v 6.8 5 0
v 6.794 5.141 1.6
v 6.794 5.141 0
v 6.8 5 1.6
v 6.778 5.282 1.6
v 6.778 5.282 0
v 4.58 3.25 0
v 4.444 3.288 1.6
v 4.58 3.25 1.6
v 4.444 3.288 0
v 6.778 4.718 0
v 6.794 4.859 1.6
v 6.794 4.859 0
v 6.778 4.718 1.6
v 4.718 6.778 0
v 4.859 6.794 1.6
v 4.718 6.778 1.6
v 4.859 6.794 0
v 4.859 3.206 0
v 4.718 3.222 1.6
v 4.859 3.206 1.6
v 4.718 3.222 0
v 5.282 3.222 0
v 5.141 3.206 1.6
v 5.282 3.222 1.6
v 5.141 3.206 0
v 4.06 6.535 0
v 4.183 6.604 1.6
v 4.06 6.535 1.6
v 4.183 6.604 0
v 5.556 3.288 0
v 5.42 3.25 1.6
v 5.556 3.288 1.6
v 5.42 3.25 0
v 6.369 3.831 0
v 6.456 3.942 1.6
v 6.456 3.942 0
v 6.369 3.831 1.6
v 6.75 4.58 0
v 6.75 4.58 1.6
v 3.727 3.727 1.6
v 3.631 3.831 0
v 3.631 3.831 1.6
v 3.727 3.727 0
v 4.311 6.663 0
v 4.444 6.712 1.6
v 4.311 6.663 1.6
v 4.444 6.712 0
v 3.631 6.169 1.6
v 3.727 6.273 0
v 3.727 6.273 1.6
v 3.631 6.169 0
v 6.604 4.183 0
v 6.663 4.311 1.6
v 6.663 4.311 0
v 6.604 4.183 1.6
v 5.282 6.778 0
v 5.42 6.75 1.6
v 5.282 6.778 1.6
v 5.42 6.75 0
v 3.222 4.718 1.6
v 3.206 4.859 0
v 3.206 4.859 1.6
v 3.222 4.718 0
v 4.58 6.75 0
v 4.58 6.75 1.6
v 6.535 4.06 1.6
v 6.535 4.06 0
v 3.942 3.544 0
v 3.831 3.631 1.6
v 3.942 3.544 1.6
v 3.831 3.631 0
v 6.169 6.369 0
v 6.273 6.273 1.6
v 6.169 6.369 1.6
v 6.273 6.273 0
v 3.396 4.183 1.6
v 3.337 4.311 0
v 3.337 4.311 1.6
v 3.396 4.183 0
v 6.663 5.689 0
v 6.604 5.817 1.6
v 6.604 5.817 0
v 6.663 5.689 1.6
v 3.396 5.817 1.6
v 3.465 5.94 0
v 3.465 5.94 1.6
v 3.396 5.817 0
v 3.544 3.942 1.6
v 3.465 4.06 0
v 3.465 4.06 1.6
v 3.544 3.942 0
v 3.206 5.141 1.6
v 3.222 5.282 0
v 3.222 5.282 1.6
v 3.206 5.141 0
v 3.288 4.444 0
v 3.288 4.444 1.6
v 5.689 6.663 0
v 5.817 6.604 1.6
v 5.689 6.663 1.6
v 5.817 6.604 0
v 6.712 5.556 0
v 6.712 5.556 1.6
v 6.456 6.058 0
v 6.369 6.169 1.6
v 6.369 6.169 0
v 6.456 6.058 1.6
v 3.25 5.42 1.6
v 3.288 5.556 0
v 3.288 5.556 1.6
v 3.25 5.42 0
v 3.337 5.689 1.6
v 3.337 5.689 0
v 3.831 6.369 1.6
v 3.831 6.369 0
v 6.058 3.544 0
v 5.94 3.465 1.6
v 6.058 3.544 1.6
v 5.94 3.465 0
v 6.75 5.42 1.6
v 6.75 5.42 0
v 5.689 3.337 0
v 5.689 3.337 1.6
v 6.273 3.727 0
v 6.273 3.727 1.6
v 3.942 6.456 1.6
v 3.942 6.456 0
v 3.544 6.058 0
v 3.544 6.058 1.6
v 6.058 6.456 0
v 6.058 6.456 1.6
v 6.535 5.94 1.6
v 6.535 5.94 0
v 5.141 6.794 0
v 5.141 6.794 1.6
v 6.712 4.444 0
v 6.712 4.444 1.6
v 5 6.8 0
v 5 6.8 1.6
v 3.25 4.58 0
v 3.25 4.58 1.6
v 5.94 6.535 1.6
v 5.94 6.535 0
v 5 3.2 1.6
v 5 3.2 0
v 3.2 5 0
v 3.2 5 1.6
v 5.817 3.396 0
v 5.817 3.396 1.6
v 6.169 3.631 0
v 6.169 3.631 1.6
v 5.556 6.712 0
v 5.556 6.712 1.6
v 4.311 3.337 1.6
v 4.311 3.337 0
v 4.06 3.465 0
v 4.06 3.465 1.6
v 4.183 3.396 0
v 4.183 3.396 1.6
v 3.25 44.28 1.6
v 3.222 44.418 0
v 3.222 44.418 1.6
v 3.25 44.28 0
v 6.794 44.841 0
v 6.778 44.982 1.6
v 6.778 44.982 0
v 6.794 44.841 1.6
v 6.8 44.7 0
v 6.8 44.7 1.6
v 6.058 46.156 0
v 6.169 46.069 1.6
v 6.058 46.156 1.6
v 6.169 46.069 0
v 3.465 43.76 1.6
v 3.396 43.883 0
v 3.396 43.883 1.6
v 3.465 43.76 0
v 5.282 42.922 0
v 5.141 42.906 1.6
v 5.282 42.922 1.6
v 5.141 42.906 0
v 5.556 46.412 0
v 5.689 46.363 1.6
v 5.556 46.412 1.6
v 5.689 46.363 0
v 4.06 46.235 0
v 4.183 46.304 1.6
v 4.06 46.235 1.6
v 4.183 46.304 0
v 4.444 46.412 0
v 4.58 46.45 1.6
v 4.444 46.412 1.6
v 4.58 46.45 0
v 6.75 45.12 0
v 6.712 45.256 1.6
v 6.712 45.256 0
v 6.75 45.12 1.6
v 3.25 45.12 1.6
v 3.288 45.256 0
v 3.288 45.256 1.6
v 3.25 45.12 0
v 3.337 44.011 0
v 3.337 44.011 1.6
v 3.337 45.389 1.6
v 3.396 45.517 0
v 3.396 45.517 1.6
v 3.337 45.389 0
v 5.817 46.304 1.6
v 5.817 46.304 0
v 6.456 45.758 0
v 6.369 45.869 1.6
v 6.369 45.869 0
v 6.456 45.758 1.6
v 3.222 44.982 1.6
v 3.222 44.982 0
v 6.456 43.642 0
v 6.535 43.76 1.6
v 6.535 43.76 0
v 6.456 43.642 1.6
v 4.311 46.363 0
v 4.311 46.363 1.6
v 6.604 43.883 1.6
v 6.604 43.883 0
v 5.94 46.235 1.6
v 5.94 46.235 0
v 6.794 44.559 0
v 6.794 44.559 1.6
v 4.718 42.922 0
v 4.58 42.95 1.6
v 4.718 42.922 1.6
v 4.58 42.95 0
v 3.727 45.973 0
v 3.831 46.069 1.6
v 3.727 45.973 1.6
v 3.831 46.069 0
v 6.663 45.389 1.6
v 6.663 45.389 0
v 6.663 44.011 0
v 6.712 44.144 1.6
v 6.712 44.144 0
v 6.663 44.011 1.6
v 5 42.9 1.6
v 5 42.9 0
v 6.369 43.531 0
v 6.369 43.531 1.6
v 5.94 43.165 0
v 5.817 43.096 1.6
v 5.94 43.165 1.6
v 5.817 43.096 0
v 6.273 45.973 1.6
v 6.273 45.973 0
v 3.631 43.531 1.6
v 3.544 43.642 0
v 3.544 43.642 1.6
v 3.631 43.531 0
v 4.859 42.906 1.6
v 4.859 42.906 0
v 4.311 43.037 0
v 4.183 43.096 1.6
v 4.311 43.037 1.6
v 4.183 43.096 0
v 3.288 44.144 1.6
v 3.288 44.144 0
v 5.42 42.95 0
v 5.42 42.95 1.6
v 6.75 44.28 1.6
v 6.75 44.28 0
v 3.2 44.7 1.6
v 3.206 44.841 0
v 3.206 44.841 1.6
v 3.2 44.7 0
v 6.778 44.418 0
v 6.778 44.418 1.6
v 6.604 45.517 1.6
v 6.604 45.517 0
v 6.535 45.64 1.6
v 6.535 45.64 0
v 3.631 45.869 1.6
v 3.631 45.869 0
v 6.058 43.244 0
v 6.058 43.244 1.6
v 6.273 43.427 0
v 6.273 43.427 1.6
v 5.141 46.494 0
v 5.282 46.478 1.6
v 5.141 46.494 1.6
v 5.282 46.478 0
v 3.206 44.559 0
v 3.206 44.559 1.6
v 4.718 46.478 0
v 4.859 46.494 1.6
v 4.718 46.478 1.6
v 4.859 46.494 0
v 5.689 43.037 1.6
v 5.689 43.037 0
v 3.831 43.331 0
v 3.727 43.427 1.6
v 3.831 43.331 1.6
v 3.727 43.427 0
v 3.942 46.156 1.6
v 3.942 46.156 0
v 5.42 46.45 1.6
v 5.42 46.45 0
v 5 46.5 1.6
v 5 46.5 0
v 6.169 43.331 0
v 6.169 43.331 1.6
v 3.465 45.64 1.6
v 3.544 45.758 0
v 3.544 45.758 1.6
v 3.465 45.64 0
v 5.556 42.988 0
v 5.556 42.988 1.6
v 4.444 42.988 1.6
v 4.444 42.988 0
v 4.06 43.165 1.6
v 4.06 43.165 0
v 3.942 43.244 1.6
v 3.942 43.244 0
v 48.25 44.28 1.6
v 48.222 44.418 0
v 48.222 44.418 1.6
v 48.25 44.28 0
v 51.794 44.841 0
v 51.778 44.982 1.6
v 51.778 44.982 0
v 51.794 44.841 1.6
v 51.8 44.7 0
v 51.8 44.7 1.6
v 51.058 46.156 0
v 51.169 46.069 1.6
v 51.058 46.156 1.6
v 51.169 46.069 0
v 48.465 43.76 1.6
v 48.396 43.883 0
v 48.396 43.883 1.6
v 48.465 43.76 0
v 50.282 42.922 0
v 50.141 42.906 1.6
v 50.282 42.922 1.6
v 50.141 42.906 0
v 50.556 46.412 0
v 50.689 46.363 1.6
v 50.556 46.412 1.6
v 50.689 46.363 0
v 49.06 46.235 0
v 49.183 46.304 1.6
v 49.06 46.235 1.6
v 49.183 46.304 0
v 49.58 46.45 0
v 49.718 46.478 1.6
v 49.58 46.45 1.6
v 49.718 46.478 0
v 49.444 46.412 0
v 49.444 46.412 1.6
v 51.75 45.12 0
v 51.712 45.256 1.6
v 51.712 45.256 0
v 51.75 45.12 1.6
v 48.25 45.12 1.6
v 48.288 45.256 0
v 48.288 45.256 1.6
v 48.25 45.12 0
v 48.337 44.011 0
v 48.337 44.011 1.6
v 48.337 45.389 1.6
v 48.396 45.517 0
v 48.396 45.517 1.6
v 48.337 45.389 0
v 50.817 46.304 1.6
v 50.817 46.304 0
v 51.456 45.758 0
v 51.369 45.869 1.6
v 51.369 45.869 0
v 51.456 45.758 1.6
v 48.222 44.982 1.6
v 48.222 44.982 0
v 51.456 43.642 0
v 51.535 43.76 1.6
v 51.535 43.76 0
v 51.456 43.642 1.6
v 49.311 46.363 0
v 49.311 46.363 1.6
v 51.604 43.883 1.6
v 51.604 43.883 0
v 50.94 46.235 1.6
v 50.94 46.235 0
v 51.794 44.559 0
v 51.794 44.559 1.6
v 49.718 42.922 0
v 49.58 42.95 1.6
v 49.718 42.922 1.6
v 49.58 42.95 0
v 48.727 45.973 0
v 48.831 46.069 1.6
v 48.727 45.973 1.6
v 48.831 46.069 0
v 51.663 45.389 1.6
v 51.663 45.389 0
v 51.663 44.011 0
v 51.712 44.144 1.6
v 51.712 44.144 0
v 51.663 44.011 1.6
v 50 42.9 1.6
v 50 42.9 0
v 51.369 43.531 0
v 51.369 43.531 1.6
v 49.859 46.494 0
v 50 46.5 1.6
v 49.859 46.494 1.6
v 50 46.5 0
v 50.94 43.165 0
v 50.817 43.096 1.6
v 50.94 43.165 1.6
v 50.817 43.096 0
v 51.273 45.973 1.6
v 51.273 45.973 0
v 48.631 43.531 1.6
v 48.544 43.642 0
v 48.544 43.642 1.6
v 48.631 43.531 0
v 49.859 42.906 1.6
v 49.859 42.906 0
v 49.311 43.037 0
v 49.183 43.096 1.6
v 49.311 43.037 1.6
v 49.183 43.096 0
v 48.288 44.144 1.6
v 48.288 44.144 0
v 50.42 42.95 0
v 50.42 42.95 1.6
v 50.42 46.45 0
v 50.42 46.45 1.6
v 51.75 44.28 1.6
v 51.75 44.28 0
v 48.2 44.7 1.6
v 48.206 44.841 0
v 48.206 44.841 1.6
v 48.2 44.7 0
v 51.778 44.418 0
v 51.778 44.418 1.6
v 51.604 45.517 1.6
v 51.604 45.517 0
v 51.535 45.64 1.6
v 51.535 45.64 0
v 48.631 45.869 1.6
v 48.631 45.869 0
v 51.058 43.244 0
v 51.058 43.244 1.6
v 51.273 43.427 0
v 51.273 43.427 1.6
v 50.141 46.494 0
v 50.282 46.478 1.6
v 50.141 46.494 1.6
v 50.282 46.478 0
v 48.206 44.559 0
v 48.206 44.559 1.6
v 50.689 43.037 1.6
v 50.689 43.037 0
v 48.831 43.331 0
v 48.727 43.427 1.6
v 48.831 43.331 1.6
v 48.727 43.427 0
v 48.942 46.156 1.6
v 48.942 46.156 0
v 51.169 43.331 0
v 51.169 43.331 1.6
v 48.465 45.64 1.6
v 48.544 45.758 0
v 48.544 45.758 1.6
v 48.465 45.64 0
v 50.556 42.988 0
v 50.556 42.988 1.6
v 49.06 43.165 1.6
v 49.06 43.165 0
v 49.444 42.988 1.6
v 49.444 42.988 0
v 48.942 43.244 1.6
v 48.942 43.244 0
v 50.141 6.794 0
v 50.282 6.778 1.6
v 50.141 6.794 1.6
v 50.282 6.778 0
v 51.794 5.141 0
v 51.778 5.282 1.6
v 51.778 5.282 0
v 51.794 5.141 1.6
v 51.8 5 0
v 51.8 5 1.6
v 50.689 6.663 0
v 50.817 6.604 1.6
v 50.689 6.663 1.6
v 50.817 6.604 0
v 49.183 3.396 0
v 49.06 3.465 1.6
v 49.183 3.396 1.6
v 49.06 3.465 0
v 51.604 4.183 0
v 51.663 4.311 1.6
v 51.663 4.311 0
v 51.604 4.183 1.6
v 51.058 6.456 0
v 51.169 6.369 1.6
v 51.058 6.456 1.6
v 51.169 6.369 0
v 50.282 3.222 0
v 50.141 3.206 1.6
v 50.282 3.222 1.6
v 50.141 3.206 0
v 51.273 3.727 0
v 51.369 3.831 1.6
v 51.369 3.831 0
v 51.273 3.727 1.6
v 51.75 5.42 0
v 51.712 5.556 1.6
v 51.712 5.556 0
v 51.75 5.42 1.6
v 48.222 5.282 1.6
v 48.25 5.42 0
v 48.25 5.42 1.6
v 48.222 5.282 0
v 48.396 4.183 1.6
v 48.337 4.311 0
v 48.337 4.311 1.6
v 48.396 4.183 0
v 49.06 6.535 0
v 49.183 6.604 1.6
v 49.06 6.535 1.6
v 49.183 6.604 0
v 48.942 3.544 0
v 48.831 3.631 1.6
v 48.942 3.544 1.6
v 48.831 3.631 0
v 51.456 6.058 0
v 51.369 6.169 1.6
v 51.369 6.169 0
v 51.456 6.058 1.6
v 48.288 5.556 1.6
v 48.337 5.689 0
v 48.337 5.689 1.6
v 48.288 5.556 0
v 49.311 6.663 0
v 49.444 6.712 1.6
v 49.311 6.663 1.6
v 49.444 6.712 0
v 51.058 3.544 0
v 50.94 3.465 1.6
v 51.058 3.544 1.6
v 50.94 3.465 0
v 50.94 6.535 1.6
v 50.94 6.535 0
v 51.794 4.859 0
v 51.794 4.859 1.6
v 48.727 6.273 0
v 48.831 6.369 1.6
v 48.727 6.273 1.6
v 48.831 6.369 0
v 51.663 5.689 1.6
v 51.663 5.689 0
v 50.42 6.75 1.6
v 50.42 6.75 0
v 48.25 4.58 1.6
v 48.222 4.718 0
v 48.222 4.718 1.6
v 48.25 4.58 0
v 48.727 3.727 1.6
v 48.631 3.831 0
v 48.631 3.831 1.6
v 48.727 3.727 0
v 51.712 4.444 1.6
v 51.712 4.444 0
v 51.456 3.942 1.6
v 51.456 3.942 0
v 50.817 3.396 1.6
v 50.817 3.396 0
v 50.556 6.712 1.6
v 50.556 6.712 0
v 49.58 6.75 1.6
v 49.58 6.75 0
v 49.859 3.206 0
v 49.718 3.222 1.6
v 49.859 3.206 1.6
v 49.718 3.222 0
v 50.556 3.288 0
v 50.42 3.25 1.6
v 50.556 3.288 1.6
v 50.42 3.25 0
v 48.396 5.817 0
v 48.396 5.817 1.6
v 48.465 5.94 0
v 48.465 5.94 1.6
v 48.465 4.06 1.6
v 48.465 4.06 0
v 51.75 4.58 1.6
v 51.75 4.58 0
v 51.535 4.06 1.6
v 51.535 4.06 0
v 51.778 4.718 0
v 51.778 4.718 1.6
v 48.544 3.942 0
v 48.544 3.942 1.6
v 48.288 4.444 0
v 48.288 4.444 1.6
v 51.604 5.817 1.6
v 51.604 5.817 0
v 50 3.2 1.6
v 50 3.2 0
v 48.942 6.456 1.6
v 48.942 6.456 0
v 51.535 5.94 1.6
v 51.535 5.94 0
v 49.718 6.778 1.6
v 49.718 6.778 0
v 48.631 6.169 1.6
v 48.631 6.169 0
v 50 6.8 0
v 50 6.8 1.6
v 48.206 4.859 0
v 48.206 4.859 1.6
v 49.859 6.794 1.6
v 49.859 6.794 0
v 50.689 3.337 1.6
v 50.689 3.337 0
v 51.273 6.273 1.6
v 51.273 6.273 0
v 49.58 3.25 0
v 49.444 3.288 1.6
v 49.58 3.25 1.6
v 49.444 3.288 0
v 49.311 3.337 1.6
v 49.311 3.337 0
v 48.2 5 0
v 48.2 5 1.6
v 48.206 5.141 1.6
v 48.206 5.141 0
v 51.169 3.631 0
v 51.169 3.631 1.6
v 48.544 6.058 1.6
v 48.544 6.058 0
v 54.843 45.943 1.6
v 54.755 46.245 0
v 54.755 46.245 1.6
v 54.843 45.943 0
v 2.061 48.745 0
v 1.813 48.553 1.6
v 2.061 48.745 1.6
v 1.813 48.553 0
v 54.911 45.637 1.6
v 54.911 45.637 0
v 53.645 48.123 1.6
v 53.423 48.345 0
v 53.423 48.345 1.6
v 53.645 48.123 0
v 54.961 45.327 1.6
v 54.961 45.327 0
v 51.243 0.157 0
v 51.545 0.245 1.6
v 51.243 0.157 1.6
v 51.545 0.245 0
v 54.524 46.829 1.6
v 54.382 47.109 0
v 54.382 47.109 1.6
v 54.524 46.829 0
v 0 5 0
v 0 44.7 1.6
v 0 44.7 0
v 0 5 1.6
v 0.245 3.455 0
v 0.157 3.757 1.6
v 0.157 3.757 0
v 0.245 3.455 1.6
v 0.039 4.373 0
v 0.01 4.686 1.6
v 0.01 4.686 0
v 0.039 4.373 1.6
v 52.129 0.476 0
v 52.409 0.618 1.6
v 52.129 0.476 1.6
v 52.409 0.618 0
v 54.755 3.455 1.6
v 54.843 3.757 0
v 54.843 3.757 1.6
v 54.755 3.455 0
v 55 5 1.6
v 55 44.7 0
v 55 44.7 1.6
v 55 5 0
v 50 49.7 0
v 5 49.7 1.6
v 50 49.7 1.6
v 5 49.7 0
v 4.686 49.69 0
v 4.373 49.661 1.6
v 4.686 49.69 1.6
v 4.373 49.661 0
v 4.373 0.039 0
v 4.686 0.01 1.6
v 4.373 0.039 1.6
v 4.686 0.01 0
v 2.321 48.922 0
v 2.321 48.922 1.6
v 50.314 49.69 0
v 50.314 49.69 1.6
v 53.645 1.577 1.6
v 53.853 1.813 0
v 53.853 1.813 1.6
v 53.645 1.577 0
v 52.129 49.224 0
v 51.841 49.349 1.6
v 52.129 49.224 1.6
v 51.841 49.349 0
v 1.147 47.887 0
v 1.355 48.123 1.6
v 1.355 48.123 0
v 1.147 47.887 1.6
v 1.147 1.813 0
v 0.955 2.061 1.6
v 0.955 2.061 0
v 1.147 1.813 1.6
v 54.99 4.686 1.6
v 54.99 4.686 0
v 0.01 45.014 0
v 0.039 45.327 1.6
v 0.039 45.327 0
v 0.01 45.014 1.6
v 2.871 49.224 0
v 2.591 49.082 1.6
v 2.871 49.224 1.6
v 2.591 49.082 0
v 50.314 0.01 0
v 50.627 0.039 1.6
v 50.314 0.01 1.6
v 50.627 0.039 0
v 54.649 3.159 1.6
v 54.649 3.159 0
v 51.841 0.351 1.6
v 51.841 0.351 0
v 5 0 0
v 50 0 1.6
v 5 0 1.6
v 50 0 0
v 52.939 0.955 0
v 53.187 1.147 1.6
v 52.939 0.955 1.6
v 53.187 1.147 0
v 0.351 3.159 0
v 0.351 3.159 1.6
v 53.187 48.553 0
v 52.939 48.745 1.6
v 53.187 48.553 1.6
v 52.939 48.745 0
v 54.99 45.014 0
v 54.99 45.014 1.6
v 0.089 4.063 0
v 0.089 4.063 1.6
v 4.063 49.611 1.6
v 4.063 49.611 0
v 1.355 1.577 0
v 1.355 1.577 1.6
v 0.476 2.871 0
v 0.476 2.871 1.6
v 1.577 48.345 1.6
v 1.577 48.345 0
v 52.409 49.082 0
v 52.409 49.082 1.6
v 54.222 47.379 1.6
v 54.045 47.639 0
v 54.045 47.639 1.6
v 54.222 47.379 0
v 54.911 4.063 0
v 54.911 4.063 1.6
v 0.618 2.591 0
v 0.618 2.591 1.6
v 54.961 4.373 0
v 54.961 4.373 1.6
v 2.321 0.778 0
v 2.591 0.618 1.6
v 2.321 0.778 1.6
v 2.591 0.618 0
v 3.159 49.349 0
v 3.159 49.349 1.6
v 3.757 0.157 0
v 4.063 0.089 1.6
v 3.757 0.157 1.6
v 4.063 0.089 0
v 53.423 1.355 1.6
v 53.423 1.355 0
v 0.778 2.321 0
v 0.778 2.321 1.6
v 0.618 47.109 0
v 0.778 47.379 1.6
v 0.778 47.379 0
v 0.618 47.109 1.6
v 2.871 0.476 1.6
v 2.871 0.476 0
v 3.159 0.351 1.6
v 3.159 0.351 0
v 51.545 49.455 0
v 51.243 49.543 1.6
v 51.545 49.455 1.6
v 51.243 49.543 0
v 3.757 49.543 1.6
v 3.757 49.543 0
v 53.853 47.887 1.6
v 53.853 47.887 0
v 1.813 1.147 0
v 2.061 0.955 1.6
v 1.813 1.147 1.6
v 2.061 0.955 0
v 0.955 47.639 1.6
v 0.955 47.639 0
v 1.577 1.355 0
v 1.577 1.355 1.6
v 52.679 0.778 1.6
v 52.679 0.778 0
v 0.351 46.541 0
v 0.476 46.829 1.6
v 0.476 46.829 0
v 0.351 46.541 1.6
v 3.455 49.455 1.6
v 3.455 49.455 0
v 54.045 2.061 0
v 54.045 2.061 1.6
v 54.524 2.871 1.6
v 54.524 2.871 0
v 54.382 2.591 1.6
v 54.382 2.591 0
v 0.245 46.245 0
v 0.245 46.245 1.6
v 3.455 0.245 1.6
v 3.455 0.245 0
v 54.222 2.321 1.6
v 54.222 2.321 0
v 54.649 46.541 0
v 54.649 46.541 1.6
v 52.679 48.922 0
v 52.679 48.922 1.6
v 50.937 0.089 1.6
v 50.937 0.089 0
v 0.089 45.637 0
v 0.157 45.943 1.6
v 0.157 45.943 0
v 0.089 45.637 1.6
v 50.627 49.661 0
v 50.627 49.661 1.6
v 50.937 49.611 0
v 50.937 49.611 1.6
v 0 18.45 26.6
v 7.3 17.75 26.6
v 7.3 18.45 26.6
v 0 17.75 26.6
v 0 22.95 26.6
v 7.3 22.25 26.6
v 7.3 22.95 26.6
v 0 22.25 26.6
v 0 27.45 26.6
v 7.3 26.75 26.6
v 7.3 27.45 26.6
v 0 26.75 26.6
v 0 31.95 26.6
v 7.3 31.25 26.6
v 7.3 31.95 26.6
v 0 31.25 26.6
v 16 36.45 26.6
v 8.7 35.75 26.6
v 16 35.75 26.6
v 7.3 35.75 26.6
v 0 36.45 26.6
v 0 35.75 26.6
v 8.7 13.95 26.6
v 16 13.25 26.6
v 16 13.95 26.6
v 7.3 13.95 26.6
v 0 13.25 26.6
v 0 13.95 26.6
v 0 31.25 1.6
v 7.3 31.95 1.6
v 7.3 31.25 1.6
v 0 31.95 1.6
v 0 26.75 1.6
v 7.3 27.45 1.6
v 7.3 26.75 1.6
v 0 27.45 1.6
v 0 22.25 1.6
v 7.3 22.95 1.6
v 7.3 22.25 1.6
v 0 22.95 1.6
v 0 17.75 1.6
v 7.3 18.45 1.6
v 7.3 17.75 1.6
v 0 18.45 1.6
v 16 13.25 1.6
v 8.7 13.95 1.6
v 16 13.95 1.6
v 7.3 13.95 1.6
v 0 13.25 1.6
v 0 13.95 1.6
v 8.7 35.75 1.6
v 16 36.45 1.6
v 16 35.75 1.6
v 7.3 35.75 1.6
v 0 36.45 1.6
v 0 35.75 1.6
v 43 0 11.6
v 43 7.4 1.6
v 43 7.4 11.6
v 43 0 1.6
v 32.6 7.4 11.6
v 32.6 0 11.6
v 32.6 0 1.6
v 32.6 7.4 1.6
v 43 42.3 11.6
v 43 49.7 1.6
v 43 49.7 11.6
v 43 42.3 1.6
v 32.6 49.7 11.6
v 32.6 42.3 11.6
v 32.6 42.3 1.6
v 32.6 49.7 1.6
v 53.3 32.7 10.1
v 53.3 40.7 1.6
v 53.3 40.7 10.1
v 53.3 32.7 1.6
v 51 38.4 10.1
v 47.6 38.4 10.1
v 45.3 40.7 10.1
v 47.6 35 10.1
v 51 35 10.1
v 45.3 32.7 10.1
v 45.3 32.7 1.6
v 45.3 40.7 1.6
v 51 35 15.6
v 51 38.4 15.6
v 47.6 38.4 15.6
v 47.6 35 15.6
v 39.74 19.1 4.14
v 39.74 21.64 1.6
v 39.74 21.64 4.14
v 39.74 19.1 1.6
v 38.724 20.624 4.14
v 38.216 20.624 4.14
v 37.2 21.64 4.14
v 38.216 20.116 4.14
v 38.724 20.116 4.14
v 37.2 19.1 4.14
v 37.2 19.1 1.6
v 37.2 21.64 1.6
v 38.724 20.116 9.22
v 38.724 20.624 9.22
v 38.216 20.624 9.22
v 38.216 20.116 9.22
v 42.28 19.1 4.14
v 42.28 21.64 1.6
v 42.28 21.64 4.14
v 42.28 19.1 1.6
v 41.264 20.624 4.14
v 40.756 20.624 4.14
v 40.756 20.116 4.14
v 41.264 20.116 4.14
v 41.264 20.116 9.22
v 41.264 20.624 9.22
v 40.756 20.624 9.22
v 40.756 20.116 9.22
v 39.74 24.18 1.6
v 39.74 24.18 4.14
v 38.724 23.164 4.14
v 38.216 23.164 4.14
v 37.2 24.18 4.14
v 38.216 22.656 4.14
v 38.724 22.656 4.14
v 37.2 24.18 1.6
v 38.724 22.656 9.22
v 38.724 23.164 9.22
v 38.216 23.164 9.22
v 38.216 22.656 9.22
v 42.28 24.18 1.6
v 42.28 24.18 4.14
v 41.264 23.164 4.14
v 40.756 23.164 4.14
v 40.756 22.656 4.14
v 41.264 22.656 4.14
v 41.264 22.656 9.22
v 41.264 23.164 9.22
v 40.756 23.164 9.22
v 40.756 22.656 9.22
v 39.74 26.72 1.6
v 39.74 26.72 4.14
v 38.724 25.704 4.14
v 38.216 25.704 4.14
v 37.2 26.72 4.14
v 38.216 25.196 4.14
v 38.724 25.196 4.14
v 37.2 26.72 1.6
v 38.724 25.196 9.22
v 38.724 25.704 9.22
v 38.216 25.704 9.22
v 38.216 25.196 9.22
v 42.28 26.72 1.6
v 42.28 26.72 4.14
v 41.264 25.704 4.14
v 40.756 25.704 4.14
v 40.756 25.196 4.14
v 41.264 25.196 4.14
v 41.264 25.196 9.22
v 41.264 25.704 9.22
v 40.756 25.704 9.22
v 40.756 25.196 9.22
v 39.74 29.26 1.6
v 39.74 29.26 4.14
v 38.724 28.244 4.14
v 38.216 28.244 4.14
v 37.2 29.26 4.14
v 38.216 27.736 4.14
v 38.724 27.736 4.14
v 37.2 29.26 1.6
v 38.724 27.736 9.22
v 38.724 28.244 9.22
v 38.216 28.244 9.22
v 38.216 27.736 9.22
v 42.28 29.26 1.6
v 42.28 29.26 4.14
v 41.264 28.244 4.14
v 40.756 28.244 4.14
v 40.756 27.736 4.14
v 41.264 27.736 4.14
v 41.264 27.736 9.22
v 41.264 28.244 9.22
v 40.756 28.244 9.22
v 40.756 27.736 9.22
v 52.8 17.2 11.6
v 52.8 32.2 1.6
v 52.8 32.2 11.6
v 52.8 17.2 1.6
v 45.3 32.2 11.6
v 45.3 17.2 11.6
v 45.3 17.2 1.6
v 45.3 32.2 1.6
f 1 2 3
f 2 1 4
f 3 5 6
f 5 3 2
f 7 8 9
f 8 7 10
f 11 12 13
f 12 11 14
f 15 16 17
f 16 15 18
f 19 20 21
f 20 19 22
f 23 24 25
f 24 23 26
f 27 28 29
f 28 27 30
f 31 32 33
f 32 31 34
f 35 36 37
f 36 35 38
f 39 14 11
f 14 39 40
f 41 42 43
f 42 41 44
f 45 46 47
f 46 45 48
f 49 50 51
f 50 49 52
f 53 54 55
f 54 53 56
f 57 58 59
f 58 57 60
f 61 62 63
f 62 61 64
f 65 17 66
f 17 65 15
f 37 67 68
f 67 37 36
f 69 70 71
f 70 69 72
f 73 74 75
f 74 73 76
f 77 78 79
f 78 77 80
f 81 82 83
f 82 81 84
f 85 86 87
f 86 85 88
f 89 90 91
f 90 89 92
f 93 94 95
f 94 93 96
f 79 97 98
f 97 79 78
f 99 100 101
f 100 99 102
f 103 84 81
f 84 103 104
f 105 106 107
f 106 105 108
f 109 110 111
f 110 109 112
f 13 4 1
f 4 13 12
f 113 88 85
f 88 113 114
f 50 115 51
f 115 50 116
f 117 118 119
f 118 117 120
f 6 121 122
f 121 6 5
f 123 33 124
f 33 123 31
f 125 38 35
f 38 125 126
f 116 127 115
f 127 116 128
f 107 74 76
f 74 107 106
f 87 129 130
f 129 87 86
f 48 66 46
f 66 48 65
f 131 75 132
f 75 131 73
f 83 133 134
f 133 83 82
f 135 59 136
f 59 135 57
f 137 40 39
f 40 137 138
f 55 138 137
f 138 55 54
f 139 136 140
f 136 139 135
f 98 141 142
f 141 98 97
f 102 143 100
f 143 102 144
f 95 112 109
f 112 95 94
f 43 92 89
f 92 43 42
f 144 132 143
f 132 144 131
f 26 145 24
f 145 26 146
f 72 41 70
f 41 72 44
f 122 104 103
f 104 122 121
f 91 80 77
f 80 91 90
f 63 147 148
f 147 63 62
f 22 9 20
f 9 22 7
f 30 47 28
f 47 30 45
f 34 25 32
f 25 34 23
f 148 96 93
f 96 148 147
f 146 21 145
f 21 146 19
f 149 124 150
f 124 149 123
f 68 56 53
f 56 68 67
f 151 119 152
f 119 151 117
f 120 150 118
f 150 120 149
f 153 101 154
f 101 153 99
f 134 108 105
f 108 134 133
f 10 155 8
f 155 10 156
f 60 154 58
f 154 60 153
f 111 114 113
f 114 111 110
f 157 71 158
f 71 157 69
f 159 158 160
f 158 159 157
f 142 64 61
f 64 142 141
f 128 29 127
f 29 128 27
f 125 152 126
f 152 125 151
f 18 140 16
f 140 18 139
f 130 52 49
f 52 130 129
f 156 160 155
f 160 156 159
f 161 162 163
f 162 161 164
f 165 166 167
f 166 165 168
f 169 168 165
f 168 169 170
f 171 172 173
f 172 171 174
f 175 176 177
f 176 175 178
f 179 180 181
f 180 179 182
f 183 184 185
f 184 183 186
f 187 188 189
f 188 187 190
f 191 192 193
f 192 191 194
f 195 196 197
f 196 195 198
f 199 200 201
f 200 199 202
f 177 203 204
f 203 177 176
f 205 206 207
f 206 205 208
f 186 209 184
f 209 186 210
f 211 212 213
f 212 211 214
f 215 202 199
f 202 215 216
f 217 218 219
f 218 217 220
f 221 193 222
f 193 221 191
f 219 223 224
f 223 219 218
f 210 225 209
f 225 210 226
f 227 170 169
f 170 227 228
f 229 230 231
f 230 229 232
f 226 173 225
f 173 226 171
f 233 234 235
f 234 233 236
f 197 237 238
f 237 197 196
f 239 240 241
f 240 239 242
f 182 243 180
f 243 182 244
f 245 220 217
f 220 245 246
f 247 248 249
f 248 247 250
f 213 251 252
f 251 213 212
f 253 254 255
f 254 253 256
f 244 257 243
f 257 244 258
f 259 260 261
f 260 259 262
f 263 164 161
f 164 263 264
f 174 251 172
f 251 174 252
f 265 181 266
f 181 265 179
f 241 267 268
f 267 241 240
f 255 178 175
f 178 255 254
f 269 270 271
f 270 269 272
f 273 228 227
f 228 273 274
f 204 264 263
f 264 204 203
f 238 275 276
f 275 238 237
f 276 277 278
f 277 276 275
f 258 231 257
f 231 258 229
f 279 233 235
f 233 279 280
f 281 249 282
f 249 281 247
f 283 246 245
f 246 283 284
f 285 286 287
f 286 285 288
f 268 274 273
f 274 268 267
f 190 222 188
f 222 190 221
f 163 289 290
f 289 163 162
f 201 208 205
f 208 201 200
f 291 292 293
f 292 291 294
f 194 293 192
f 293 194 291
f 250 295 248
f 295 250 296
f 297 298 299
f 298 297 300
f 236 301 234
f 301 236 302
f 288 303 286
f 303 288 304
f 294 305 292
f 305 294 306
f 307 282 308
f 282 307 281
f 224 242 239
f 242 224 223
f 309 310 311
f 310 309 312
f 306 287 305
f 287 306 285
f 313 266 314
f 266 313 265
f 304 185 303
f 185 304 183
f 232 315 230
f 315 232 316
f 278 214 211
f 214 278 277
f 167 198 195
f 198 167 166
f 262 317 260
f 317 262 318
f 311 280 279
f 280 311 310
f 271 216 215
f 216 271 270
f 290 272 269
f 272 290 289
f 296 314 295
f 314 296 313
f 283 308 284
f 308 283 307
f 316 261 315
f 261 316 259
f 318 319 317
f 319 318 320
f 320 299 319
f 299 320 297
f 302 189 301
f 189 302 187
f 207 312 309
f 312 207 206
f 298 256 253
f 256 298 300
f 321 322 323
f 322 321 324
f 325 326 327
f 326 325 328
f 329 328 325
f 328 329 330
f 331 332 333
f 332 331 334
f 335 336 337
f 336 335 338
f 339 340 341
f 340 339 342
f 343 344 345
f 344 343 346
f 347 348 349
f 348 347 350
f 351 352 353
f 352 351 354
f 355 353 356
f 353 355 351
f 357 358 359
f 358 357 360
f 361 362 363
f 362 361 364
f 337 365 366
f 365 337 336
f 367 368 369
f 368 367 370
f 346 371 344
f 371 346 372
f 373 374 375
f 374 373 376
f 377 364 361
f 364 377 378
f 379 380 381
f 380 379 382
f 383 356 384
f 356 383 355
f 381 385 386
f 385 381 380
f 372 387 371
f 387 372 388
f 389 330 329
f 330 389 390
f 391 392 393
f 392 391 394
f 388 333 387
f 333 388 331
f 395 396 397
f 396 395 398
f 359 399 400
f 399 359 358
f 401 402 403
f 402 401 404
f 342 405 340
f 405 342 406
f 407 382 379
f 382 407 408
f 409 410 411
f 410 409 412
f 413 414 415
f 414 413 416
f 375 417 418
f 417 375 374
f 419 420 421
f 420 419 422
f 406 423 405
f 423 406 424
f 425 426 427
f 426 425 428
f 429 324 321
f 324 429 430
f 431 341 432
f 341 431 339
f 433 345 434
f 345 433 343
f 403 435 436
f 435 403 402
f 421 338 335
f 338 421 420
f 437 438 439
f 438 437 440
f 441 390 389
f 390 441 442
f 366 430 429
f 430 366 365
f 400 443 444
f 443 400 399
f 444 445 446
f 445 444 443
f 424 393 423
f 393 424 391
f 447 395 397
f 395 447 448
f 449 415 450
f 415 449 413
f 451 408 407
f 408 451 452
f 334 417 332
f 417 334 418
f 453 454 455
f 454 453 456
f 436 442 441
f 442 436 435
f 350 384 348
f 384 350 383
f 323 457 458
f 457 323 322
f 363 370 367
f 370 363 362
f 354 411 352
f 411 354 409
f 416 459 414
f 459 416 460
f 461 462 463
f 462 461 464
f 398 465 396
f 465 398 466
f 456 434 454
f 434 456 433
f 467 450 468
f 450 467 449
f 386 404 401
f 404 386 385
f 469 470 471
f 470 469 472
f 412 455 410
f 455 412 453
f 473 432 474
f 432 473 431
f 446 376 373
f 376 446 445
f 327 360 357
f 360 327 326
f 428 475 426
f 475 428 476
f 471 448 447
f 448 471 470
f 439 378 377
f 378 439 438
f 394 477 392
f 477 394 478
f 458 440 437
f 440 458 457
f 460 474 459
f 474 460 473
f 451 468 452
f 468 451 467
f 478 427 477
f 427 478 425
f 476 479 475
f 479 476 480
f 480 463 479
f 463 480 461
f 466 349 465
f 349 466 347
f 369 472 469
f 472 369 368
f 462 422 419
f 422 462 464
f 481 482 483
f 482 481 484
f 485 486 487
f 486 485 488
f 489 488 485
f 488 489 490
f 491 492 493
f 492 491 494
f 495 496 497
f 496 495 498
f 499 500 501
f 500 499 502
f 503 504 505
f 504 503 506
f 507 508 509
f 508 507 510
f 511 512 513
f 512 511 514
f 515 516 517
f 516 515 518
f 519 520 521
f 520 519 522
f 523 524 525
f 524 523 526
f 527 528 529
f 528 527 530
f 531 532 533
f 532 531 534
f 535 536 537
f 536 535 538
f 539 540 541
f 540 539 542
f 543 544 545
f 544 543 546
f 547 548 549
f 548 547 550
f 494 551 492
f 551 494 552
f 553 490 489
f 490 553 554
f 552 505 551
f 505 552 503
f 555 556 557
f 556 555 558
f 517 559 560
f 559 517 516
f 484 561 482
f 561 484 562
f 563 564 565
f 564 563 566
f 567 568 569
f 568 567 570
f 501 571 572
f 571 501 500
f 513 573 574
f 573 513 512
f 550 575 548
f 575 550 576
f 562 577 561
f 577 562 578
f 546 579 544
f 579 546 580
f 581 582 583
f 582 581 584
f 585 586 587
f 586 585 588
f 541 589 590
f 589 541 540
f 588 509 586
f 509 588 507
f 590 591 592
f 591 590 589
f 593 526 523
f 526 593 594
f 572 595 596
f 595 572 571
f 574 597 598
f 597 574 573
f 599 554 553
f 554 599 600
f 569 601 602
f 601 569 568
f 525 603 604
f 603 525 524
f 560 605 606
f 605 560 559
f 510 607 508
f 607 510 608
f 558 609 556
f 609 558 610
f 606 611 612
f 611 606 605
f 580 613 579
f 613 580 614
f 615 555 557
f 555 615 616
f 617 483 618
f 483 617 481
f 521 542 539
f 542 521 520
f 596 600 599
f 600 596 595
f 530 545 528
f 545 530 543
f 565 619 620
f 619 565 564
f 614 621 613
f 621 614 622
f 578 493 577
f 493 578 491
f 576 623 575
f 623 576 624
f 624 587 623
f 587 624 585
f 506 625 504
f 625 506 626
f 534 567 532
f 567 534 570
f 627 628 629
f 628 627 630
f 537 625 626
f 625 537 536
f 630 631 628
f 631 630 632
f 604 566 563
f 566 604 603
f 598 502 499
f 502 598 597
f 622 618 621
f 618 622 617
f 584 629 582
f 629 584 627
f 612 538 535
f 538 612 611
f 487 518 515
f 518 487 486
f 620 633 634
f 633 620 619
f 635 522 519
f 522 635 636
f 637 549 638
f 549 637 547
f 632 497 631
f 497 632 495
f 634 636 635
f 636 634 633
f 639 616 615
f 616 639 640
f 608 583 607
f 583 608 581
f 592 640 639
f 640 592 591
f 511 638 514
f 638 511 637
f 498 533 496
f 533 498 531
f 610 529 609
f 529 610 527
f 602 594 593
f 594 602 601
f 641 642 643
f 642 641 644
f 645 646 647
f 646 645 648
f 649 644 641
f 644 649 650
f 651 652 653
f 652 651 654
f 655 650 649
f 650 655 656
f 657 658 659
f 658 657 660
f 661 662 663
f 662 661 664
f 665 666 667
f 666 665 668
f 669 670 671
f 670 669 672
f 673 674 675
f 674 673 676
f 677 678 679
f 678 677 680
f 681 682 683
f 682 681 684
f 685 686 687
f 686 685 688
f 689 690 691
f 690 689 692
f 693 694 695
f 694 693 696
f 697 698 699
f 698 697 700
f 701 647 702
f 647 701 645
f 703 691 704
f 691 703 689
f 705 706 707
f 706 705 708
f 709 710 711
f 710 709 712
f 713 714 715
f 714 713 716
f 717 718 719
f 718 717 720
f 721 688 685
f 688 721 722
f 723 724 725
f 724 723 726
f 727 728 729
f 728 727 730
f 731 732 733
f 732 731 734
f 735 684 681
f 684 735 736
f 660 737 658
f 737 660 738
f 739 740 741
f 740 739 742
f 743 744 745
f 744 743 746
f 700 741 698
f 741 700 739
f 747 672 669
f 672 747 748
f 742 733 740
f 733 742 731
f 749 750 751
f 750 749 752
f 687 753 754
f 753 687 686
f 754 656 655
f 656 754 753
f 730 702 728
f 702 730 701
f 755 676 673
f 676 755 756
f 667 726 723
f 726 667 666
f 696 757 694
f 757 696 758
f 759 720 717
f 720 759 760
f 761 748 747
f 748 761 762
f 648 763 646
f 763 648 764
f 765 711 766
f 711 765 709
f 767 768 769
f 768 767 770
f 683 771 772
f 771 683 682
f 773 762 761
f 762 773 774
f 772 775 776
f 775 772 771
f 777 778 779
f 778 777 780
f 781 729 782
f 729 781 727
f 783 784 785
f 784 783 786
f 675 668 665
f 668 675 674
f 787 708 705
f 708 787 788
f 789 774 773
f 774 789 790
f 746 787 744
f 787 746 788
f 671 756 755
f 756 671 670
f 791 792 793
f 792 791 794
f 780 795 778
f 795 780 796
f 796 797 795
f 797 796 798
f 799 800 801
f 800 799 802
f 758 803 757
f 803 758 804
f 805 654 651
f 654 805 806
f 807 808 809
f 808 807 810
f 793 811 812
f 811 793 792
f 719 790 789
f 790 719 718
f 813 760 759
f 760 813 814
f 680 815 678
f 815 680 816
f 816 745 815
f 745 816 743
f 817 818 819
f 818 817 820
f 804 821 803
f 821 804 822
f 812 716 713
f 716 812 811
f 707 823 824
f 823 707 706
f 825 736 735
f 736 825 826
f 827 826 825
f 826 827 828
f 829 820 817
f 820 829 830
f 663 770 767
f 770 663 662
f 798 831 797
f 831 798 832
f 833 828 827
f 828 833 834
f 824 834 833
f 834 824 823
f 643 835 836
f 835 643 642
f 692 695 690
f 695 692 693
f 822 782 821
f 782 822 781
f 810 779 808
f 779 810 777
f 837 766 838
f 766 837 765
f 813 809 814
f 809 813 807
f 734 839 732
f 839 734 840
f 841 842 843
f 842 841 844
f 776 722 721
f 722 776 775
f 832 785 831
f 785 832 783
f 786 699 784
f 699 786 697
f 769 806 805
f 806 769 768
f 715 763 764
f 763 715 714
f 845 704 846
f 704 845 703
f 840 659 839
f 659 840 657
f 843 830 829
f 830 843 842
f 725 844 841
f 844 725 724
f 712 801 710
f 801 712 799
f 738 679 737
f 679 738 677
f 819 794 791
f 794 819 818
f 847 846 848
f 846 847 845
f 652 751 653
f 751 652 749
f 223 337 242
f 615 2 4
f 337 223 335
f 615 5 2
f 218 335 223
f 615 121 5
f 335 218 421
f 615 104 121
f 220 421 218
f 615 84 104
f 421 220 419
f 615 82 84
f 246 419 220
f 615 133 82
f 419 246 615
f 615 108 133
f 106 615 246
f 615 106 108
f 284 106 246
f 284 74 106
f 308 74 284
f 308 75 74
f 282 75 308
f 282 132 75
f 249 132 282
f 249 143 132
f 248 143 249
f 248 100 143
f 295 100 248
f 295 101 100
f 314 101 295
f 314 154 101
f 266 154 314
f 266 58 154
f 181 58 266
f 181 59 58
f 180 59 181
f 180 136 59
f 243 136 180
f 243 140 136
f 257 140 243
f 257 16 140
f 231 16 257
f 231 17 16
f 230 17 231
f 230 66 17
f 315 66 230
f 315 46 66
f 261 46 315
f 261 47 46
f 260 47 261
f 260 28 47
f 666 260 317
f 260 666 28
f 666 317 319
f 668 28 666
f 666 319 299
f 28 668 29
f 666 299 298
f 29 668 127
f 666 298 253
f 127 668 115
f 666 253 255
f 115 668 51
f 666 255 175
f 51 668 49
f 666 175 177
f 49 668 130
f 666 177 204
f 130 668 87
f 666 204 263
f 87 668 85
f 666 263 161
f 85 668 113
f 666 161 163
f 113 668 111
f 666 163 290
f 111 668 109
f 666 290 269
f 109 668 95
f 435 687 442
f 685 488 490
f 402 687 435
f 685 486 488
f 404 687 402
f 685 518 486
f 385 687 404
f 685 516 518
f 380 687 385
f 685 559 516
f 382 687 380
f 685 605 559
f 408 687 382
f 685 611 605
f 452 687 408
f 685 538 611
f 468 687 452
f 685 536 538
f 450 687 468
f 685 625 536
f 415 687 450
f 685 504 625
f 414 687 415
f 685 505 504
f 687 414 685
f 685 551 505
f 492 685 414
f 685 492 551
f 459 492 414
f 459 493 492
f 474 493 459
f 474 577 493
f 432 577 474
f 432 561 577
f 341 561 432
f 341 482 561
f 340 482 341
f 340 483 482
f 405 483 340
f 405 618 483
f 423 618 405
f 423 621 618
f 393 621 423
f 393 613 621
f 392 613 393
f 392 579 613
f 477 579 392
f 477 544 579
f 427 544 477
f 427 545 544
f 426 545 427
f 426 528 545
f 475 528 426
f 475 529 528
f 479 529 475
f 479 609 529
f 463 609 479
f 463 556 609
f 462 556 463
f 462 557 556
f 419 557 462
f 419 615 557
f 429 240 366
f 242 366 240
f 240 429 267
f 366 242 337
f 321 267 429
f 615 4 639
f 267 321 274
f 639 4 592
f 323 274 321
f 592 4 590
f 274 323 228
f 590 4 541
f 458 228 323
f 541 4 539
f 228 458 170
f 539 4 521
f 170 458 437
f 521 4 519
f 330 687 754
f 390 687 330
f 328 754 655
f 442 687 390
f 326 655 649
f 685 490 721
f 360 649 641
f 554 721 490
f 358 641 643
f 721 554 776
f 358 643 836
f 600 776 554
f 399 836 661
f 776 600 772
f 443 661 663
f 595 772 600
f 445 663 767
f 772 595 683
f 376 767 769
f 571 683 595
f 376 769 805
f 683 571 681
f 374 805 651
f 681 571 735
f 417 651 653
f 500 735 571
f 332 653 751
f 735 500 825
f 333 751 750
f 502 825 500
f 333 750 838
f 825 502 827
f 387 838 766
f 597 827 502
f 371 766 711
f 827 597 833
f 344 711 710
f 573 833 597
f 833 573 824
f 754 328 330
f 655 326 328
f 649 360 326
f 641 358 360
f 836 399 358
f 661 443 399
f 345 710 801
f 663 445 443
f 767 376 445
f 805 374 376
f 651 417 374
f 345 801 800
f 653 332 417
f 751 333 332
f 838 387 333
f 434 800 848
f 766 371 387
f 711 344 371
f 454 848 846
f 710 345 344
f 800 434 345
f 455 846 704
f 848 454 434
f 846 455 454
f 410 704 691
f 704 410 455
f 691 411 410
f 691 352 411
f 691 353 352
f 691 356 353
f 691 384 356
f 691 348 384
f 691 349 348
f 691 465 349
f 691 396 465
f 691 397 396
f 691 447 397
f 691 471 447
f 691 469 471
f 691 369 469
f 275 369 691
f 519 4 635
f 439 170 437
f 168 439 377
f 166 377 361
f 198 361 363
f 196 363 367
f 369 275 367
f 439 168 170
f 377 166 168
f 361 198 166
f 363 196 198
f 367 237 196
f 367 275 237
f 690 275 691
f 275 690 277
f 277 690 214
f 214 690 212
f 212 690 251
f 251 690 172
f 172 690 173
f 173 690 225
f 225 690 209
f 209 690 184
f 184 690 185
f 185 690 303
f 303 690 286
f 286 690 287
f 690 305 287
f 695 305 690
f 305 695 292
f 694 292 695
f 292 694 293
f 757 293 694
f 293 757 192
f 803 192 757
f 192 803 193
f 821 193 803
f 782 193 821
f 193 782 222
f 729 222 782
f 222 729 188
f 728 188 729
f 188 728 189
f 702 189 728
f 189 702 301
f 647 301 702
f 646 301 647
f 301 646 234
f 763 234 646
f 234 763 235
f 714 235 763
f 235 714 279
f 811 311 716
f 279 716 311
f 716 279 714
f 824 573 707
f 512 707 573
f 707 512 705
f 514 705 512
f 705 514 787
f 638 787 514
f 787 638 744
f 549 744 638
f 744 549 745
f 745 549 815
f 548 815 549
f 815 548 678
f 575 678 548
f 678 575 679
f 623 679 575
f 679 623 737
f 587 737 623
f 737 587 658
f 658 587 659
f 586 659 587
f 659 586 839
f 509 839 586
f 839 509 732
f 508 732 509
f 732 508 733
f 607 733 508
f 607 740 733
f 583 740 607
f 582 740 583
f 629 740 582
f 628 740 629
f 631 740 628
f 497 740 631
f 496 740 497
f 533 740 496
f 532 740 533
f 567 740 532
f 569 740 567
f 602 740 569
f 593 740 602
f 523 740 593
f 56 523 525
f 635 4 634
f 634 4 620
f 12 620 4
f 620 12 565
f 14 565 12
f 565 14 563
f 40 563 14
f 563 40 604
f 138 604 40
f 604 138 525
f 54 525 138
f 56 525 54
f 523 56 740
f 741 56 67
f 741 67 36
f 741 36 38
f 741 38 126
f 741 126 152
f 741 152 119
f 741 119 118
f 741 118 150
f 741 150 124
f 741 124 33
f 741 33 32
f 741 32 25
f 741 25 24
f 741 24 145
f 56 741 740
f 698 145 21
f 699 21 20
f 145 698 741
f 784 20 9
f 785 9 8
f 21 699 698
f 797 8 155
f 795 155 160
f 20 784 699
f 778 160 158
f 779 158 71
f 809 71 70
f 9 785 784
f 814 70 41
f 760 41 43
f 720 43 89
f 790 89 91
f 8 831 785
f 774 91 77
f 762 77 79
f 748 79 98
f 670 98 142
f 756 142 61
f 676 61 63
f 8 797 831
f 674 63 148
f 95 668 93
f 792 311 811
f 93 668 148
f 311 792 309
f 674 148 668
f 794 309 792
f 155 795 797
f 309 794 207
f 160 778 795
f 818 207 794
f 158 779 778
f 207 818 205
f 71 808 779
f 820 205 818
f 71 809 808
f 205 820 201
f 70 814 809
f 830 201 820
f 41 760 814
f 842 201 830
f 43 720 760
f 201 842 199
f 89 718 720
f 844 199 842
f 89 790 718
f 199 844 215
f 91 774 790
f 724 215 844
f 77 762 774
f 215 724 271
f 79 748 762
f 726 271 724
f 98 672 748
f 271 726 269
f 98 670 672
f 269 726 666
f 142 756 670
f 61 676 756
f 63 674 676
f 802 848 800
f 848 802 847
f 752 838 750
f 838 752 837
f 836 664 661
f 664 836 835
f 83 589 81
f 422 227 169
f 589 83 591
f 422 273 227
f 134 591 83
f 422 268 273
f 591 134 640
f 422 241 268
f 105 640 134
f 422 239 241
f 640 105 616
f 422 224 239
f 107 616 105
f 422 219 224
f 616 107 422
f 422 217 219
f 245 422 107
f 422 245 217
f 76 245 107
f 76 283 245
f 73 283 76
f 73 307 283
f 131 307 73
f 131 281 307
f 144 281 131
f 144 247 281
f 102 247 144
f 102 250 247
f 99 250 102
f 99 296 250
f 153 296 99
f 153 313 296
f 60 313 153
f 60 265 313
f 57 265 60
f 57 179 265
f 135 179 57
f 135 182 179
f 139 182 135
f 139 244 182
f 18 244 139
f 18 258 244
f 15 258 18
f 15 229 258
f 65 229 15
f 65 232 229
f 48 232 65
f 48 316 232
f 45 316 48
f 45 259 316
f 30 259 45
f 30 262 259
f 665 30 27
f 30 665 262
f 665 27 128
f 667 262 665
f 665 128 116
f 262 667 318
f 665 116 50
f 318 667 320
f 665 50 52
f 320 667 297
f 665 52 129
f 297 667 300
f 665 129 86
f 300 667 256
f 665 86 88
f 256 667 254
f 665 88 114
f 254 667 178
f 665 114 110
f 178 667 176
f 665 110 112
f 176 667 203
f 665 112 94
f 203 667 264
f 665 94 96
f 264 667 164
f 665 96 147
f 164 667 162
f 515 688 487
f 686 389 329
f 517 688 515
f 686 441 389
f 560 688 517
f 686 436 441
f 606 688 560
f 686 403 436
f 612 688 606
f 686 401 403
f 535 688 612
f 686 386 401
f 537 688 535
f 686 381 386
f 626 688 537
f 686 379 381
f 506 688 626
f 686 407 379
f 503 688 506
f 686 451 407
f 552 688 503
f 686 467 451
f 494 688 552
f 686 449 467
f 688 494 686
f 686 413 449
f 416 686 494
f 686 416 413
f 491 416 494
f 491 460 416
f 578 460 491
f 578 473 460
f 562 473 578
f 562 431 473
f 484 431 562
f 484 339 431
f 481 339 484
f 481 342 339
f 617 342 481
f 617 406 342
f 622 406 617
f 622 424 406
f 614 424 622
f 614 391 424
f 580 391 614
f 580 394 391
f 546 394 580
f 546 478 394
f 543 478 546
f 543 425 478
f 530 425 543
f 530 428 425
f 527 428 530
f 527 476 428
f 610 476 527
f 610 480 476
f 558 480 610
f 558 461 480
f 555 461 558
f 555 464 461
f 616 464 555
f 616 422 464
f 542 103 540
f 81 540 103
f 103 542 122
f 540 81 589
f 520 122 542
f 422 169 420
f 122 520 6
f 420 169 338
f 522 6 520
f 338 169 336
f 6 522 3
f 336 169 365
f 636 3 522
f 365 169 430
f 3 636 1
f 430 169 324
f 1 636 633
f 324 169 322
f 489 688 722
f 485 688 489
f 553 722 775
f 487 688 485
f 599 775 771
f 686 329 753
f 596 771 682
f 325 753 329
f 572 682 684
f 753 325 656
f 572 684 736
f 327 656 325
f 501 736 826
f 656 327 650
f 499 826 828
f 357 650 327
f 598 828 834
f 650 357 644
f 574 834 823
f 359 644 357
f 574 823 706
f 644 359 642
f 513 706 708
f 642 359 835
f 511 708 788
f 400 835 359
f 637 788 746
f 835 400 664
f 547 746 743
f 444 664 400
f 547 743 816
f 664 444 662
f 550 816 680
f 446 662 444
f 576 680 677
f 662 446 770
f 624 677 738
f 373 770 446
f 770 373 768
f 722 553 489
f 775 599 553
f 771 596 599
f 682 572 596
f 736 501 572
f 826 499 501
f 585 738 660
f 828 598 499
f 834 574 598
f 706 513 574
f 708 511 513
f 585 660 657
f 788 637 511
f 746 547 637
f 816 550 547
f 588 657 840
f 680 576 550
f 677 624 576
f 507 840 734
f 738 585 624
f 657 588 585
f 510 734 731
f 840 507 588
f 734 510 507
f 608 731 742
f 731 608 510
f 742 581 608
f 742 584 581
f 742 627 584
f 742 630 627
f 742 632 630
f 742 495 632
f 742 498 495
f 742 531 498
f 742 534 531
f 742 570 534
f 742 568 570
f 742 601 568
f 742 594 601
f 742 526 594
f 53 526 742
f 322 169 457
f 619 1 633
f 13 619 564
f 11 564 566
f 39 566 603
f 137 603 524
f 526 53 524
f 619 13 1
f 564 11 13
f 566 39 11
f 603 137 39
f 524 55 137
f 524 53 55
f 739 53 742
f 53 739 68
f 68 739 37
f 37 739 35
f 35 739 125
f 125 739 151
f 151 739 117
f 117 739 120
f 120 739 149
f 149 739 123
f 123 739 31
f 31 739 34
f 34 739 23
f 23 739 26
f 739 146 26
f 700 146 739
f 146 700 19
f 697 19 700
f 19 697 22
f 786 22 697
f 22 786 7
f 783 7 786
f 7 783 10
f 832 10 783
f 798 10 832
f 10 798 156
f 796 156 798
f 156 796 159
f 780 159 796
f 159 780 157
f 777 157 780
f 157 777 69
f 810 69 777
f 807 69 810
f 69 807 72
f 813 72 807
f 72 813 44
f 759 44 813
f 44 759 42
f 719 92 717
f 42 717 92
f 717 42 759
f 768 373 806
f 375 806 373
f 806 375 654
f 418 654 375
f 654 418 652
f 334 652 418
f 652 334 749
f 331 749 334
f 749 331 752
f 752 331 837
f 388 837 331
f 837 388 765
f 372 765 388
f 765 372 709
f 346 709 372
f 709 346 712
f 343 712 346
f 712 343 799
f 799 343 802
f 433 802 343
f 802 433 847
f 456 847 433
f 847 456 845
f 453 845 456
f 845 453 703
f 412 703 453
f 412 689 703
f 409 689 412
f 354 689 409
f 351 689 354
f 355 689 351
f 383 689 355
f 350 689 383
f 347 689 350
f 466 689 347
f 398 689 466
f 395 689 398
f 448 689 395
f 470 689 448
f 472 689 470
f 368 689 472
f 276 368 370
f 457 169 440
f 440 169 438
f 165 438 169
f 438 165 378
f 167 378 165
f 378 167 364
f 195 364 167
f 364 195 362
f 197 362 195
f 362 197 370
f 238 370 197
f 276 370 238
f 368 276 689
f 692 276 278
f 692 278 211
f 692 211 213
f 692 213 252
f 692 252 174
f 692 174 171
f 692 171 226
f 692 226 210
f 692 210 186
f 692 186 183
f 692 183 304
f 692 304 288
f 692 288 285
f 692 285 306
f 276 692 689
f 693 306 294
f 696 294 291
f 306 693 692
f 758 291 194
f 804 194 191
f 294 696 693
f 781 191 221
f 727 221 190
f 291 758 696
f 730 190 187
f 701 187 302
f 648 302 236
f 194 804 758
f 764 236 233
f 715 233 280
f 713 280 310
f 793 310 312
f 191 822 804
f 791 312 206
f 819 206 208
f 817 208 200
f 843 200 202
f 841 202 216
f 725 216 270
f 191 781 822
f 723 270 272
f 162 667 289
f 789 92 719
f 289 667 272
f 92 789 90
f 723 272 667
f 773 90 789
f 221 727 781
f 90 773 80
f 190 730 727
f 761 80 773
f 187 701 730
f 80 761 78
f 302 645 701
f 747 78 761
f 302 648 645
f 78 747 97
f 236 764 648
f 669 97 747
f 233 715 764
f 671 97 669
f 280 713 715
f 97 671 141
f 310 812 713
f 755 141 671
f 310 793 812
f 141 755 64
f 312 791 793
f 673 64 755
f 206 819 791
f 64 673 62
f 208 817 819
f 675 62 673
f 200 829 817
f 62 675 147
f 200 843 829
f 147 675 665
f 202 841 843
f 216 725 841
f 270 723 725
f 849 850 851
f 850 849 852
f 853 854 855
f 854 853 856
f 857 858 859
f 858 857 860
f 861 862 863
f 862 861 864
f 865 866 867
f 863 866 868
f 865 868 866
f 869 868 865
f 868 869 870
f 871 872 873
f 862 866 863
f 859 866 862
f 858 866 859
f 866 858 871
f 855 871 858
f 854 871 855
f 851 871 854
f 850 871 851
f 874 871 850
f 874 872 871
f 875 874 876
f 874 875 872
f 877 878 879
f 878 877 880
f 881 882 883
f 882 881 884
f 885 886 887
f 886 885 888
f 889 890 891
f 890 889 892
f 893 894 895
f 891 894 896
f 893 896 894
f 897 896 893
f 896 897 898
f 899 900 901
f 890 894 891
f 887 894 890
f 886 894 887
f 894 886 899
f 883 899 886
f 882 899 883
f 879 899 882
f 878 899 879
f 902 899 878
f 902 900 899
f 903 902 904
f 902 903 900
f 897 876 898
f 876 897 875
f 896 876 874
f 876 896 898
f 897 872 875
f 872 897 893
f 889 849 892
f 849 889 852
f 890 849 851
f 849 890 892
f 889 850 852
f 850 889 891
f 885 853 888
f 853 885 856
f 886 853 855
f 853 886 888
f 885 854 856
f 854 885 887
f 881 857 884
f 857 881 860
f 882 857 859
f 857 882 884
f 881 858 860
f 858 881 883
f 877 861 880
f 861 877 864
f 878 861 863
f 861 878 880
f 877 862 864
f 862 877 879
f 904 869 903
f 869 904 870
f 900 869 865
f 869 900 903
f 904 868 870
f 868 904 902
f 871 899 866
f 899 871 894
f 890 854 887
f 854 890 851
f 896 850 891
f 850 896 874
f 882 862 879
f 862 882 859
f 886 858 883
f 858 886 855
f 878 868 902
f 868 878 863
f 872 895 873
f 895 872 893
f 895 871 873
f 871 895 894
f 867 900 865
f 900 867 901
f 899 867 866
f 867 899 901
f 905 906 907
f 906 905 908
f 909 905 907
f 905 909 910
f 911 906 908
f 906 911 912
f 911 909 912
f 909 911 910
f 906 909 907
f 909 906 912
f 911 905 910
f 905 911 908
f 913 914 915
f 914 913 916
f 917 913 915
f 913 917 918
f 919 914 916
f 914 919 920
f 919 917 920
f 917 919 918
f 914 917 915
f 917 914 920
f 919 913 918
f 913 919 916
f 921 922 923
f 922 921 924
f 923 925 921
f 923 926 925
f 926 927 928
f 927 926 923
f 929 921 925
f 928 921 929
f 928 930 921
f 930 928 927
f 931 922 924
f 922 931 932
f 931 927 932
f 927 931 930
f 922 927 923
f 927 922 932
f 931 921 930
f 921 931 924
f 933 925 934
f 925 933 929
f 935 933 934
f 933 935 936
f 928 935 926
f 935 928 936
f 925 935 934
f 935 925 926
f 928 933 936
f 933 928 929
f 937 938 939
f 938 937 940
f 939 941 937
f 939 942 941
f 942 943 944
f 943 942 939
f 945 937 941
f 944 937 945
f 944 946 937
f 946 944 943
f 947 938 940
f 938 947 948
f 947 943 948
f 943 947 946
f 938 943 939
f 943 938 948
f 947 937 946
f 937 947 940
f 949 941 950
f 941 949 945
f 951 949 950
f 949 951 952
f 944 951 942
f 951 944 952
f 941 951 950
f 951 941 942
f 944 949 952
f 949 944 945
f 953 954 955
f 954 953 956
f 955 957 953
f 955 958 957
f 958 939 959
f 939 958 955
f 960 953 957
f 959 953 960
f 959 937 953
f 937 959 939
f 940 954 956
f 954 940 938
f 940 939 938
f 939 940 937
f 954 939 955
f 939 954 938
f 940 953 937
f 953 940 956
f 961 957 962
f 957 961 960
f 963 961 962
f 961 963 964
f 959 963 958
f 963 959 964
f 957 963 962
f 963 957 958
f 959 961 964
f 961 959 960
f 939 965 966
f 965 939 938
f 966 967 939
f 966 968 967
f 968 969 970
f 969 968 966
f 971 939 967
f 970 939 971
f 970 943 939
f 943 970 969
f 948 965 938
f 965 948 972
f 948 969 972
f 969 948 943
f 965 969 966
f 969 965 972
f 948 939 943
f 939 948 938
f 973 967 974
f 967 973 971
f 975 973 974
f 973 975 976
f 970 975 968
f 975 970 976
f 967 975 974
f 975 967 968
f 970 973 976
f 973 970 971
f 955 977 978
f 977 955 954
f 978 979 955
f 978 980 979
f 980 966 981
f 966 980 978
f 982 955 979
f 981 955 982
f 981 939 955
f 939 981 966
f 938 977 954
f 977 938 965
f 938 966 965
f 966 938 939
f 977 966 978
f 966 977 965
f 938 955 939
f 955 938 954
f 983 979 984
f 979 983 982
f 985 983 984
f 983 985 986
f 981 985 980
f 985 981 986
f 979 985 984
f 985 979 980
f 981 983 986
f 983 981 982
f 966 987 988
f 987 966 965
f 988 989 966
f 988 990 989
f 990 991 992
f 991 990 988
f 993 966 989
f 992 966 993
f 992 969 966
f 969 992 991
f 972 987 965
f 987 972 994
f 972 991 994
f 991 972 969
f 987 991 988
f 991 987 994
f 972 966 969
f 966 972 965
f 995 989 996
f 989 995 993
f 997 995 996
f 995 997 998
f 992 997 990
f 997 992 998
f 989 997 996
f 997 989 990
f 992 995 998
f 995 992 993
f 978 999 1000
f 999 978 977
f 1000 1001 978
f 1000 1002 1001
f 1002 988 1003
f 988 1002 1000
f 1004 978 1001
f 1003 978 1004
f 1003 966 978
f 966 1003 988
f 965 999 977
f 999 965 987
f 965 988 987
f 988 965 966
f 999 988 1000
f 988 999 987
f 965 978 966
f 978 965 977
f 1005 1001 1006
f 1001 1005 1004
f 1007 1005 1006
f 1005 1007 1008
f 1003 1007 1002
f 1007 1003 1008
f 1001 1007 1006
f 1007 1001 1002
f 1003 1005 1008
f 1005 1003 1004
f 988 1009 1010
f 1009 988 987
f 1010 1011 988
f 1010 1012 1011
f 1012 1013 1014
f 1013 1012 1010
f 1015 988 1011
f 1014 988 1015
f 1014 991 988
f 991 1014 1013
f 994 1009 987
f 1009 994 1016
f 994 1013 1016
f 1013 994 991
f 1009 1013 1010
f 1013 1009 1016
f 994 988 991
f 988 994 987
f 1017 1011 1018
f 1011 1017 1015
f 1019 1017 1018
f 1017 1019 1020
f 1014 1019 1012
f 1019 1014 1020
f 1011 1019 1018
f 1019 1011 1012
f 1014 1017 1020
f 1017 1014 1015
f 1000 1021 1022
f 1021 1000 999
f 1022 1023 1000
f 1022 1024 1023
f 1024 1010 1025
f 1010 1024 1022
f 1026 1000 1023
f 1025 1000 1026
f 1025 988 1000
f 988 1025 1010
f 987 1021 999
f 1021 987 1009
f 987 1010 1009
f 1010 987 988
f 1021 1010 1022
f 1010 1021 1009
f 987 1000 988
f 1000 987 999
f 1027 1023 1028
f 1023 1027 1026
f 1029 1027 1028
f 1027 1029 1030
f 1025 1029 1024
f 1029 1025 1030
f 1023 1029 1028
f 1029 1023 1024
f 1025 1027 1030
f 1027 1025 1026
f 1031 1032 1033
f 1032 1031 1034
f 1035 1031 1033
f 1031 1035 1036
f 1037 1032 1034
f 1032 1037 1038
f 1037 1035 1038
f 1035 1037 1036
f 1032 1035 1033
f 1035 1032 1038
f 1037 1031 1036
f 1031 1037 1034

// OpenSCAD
// file: common.scad
// A library of common modules, functions and variables

// Extra dimension to remove ambiguity of walls
ex = 0.001;

// Hole dimension correction - if 3D printed holes turn out too small,
// increase the value (e.g. 1.1 = 110%), or reduce the value (e.g. 0.9 = 90%).
// Default value is 1.0 (100%)
hdc = 1.0;

// Draws a rounded rectangle
module rounded_rect(x, y, z, radius = 1) {
    translate([radius,radius,0]) //move origin to outer limits
	linear_extrude(height=z)
		minkowski() {
			square([x-2*radius,y-2*radius]); //keep outer dimensions given by x and y
			circle(r = radius, $fn=100);
		}
}

// Draws quarter of a cylinder
module cylinder_quarter(r, h){
    difference(){
        cylinder(r=r, h=h);
        translate ([-r-ex, -r-ex, -ex]) cube([2*r + 2*ex, r + ex, h + 2*ex]);
        translate ([-r-ex, -ex, -ex]) cube([r + ex, r + ex, h + 2*ex]);
    }
}

//Draws 2.54 mm male header pins
module header_pin(rows=1, columns=1){
    base_width = 2.54;
    base_height = 2.54;
    header_width = 0.508;
    header_height = 5.08;
    trans = base_width/2 - header_width/2;

    for (i = [0: rows - 1]){
        for (j = [0: columns -1]){
            translate([j*base_width, i*base_width, 0]){
                color("Black") cube([base_width, base_width, base_height]);
                translate([trans , trans, base_height])
                    color("Khaki") cube([header_width, header_width, header_height]);
            }
        }
    }

}
// main file
// L298 motor driver module 3D model

include <common.scad>;

// Defines smoothness of rounded objects
$fn = 80;

// Board dimensions: mdb = motor driver board
mdb_length = 55.0;
mdb_width = 49.7;
mdb_height = 1.6;
mdb_corner_radius = 5.0;

// Mount holes dimensions
mdb_mh_dia = 3.6*hdc; // See common.scad for hdc definition
mdb_mh_center = 5.0;
mdb_mh_xy = [ [mdb_mh_center, mdb_mh_center, -ex],
             [mdb_mh_center, mdb_width - mdb_mh_center, -ex],
             [mdb_length - mdb_mh_center, mdb_width - mdb_mh_center, -ex],
             [mdb_length - mdb_mh_center, mdb_mh_center, -ex]
           ];

// Heatsink dimensions
hs_width = 16.0;
hs_length = 23.2;
hs_height = 25.0;
hs_thickness = 0.7;

// Connectors dimensions 

// mc = motor connector
mc_length = 10.40;
mc_width = 7.40;
mc_height = 10.0;
mc_x = 32.6;

// pc = power connector
pc_length = 15.0;
pc_width = 7.5;
pc_height = 10.0;
pc_x = 45.3;
pc_y = 17.2;

// pb = power button
pb_width1 = 8.0;
pb_width2 = 3.4;
pb_height1 = 8.5;
pb_height2 = 5.5;
pb_x = pc_x;
pb_y = pc_y + pc_length + 0.5;

// ip = input pins
ip_x = 37.2;
ip_y = 19.1;

// Entry point
L298_motor_driver();

module L298_motor_driver(){
    // Draw board
    difference(){
        color("DarkSlateGray") 
            rounded_rect(mdb_length, mdb_width, mdb_height, mdb_corner_radius);
        // Mount holes
        for (i = [0:len(mdb_mh_xy)-1]) mdb_mount_hole(mdb_mh_xy [i]);
    }
    // Draw elements on the board
    translate([0, 0, mdb_height]){
        translate([0, mdb_width/2 - hs_length/2, 0]) color("DimGray") mdb_heatsink();
        translate([mc_x, 0, 0]) {
            motor_connector();
            translate([0, mdb_width - mc_width, 0]) motor_connector();
        }
        translate([pc_x, pc_y, 0]) power_connector();
        translate([pb_x, pb_y, 0]) power_button();
        translate([ip_x, ip_y, 0]) header_pin(4, 2);
    }
}

module mdb_mount_hole(vect){
    translate(vect) color("LightYellow") cylinder(d=mdb_mh_dia, mdb_height + 2*ex);
}

module mdb_heatsink(){
    for (i = [0:5]) translate([0, i*(hs_length - hs_thickness)/5 , 0]) 
        cube([hs_width/2, hs_thickness, hs_height]);
    
    translate([hs_width/2, 0, 0]){
        translate([-hs_thickness, 0, 0]) 
            cube([2*hs_thickness, hs_length, hs_height]);
        cube([hs_width/2, hs_thickness, hs_height]);
        translate([0, hs_length - hs_thickness, 0]) 
            cube([hs_width/2, hs_thickness, hs_height]);
    }
}

module motor_connector(){
    color("SpringGreen") cube([mc_length, mc_width, mc_height]);
}

module power_connector(){
    color("SteelBlue") cube([pc_width, pc_length, pc_height]);
}

module power_button(){
    trans = pb_width1/2 - pb_width2/2;
    color("White") cube([pb_width1, pb_width1, pb_height1]);
    translate([trans, trans, pb_height1])
        color("SteelBlue") cube([pb_width2, pb_width2, pb_height2]);
}
